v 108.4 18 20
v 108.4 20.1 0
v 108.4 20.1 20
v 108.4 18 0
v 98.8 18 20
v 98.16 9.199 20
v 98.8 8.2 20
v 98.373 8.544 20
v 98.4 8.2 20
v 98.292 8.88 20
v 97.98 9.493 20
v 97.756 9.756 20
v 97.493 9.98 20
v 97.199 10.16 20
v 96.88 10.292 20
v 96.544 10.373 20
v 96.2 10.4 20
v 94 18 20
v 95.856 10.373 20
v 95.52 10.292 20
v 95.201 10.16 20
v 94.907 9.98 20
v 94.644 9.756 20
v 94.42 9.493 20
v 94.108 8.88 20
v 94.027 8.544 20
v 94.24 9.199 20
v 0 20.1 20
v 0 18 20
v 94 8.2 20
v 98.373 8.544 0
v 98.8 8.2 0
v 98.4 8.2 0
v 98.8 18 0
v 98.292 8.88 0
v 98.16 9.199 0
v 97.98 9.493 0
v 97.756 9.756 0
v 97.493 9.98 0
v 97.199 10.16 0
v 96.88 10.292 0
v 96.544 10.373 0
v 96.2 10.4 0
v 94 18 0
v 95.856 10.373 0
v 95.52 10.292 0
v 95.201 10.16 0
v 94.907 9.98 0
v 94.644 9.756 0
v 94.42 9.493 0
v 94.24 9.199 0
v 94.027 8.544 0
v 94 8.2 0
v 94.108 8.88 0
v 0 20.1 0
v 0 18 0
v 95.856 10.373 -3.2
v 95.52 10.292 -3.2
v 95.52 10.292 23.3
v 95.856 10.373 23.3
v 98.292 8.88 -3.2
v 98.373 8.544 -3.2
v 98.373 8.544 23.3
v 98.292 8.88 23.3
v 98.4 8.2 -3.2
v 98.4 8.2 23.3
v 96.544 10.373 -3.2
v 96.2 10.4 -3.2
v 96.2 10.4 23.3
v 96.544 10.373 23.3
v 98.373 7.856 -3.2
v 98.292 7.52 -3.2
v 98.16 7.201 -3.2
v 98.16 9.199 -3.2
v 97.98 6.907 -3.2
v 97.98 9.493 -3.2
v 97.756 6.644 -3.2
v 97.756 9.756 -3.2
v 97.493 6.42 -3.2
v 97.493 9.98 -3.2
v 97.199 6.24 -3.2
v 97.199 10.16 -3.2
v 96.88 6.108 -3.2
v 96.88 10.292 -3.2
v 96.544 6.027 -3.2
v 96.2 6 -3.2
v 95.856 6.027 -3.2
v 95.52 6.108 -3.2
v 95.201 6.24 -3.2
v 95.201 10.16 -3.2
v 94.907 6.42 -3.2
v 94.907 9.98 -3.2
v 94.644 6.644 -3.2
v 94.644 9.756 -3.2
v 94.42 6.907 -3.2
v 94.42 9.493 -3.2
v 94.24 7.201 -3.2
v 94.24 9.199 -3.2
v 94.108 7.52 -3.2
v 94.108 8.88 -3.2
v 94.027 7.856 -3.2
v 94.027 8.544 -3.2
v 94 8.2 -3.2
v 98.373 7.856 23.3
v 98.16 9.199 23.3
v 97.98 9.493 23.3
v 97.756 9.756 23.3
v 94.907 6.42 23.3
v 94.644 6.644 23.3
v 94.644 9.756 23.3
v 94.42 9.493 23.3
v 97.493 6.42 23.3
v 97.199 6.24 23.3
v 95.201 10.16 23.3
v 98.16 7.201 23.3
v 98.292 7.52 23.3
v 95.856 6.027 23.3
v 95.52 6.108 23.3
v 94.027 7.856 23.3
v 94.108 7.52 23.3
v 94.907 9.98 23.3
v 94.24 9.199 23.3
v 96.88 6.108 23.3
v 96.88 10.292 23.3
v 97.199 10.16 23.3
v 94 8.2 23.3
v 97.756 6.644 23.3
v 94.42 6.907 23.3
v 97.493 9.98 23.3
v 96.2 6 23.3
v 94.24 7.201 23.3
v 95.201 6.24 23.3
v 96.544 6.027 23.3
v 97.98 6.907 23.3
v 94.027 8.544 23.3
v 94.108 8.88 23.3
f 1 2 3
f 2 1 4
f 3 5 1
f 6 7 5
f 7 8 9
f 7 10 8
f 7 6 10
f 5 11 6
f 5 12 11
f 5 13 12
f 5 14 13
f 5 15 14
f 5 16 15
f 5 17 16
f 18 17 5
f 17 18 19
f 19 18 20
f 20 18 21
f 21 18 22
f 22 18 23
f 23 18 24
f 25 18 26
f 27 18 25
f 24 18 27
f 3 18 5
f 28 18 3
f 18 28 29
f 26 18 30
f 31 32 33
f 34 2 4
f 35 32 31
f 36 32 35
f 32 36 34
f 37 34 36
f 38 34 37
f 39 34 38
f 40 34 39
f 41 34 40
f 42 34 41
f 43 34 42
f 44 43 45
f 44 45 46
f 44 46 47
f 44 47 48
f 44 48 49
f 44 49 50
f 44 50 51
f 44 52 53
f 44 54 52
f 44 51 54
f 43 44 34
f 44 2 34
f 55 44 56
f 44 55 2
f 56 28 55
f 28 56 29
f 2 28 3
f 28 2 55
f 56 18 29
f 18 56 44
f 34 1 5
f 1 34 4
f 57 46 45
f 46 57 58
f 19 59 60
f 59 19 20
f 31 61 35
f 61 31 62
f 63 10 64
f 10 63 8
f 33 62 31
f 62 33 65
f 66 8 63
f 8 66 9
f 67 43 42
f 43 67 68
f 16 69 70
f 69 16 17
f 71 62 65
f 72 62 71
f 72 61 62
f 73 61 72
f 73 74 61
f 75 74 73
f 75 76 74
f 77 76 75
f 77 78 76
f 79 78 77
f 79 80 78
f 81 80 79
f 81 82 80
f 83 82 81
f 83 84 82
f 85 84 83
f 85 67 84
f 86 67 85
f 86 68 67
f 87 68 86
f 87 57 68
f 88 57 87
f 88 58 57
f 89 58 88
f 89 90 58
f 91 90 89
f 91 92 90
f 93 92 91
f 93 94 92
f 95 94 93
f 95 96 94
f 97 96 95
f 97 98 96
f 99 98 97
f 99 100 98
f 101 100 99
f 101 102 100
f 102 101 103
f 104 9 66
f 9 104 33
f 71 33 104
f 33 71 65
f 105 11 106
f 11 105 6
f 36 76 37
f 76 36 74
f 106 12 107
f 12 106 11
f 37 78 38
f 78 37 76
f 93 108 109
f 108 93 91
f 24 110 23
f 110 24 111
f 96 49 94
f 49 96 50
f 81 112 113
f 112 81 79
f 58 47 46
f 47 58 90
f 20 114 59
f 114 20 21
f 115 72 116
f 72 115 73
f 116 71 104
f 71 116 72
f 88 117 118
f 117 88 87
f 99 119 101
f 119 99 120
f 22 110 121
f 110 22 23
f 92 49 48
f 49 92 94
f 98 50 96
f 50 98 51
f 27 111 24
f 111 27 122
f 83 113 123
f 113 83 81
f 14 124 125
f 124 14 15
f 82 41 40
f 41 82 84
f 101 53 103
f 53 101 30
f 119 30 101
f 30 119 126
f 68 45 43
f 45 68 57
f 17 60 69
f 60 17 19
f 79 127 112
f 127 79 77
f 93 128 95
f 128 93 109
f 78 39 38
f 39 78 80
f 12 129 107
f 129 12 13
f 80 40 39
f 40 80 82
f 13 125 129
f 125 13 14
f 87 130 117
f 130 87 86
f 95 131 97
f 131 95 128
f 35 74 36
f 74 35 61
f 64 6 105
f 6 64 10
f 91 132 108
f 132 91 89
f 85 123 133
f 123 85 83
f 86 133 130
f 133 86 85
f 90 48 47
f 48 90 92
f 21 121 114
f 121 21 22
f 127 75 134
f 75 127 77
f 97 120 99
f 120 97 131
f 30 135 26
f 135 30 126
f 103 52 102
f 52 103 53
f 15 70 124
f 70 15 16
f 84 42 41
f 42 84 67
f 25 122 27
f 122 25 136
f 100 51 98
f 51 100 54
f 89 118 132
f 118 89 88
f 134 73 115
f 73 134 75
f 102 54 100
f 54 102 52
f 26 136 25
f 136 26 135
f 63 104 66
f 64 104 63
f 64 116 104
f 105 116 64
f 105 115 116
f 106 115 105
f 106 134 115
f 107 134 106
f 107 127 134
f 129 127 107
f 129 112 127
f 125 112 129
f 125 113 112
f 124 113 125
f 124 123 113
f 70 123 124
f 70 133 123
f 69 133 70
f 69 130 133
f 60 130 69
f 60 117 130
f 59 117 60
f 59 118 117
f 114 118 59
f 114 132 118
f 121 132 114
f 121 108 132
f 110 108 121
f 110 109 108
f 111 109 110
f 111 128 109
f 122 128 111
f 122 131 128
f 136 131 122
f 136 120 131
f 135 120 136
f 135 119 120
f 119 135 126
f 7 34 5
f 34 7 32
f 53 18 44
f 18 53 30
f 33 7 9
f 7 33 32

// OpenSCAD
$fn=40;

module front(width)
{
    translate([0,18,0])
        cube([width,2.1,20]);
    
//    color("blue")
    translate([width-12.2,8.2,-3.2])
        cylinder(r=2.2,h=26.5);
    
    translate([width-14.4,8.2,0])
        cube([4.8,10,20]);
}

//translate([108,0,23.2])
//    rotate([0,90,90])
//        latch();
//latch_internal_support();

front(108.4);
